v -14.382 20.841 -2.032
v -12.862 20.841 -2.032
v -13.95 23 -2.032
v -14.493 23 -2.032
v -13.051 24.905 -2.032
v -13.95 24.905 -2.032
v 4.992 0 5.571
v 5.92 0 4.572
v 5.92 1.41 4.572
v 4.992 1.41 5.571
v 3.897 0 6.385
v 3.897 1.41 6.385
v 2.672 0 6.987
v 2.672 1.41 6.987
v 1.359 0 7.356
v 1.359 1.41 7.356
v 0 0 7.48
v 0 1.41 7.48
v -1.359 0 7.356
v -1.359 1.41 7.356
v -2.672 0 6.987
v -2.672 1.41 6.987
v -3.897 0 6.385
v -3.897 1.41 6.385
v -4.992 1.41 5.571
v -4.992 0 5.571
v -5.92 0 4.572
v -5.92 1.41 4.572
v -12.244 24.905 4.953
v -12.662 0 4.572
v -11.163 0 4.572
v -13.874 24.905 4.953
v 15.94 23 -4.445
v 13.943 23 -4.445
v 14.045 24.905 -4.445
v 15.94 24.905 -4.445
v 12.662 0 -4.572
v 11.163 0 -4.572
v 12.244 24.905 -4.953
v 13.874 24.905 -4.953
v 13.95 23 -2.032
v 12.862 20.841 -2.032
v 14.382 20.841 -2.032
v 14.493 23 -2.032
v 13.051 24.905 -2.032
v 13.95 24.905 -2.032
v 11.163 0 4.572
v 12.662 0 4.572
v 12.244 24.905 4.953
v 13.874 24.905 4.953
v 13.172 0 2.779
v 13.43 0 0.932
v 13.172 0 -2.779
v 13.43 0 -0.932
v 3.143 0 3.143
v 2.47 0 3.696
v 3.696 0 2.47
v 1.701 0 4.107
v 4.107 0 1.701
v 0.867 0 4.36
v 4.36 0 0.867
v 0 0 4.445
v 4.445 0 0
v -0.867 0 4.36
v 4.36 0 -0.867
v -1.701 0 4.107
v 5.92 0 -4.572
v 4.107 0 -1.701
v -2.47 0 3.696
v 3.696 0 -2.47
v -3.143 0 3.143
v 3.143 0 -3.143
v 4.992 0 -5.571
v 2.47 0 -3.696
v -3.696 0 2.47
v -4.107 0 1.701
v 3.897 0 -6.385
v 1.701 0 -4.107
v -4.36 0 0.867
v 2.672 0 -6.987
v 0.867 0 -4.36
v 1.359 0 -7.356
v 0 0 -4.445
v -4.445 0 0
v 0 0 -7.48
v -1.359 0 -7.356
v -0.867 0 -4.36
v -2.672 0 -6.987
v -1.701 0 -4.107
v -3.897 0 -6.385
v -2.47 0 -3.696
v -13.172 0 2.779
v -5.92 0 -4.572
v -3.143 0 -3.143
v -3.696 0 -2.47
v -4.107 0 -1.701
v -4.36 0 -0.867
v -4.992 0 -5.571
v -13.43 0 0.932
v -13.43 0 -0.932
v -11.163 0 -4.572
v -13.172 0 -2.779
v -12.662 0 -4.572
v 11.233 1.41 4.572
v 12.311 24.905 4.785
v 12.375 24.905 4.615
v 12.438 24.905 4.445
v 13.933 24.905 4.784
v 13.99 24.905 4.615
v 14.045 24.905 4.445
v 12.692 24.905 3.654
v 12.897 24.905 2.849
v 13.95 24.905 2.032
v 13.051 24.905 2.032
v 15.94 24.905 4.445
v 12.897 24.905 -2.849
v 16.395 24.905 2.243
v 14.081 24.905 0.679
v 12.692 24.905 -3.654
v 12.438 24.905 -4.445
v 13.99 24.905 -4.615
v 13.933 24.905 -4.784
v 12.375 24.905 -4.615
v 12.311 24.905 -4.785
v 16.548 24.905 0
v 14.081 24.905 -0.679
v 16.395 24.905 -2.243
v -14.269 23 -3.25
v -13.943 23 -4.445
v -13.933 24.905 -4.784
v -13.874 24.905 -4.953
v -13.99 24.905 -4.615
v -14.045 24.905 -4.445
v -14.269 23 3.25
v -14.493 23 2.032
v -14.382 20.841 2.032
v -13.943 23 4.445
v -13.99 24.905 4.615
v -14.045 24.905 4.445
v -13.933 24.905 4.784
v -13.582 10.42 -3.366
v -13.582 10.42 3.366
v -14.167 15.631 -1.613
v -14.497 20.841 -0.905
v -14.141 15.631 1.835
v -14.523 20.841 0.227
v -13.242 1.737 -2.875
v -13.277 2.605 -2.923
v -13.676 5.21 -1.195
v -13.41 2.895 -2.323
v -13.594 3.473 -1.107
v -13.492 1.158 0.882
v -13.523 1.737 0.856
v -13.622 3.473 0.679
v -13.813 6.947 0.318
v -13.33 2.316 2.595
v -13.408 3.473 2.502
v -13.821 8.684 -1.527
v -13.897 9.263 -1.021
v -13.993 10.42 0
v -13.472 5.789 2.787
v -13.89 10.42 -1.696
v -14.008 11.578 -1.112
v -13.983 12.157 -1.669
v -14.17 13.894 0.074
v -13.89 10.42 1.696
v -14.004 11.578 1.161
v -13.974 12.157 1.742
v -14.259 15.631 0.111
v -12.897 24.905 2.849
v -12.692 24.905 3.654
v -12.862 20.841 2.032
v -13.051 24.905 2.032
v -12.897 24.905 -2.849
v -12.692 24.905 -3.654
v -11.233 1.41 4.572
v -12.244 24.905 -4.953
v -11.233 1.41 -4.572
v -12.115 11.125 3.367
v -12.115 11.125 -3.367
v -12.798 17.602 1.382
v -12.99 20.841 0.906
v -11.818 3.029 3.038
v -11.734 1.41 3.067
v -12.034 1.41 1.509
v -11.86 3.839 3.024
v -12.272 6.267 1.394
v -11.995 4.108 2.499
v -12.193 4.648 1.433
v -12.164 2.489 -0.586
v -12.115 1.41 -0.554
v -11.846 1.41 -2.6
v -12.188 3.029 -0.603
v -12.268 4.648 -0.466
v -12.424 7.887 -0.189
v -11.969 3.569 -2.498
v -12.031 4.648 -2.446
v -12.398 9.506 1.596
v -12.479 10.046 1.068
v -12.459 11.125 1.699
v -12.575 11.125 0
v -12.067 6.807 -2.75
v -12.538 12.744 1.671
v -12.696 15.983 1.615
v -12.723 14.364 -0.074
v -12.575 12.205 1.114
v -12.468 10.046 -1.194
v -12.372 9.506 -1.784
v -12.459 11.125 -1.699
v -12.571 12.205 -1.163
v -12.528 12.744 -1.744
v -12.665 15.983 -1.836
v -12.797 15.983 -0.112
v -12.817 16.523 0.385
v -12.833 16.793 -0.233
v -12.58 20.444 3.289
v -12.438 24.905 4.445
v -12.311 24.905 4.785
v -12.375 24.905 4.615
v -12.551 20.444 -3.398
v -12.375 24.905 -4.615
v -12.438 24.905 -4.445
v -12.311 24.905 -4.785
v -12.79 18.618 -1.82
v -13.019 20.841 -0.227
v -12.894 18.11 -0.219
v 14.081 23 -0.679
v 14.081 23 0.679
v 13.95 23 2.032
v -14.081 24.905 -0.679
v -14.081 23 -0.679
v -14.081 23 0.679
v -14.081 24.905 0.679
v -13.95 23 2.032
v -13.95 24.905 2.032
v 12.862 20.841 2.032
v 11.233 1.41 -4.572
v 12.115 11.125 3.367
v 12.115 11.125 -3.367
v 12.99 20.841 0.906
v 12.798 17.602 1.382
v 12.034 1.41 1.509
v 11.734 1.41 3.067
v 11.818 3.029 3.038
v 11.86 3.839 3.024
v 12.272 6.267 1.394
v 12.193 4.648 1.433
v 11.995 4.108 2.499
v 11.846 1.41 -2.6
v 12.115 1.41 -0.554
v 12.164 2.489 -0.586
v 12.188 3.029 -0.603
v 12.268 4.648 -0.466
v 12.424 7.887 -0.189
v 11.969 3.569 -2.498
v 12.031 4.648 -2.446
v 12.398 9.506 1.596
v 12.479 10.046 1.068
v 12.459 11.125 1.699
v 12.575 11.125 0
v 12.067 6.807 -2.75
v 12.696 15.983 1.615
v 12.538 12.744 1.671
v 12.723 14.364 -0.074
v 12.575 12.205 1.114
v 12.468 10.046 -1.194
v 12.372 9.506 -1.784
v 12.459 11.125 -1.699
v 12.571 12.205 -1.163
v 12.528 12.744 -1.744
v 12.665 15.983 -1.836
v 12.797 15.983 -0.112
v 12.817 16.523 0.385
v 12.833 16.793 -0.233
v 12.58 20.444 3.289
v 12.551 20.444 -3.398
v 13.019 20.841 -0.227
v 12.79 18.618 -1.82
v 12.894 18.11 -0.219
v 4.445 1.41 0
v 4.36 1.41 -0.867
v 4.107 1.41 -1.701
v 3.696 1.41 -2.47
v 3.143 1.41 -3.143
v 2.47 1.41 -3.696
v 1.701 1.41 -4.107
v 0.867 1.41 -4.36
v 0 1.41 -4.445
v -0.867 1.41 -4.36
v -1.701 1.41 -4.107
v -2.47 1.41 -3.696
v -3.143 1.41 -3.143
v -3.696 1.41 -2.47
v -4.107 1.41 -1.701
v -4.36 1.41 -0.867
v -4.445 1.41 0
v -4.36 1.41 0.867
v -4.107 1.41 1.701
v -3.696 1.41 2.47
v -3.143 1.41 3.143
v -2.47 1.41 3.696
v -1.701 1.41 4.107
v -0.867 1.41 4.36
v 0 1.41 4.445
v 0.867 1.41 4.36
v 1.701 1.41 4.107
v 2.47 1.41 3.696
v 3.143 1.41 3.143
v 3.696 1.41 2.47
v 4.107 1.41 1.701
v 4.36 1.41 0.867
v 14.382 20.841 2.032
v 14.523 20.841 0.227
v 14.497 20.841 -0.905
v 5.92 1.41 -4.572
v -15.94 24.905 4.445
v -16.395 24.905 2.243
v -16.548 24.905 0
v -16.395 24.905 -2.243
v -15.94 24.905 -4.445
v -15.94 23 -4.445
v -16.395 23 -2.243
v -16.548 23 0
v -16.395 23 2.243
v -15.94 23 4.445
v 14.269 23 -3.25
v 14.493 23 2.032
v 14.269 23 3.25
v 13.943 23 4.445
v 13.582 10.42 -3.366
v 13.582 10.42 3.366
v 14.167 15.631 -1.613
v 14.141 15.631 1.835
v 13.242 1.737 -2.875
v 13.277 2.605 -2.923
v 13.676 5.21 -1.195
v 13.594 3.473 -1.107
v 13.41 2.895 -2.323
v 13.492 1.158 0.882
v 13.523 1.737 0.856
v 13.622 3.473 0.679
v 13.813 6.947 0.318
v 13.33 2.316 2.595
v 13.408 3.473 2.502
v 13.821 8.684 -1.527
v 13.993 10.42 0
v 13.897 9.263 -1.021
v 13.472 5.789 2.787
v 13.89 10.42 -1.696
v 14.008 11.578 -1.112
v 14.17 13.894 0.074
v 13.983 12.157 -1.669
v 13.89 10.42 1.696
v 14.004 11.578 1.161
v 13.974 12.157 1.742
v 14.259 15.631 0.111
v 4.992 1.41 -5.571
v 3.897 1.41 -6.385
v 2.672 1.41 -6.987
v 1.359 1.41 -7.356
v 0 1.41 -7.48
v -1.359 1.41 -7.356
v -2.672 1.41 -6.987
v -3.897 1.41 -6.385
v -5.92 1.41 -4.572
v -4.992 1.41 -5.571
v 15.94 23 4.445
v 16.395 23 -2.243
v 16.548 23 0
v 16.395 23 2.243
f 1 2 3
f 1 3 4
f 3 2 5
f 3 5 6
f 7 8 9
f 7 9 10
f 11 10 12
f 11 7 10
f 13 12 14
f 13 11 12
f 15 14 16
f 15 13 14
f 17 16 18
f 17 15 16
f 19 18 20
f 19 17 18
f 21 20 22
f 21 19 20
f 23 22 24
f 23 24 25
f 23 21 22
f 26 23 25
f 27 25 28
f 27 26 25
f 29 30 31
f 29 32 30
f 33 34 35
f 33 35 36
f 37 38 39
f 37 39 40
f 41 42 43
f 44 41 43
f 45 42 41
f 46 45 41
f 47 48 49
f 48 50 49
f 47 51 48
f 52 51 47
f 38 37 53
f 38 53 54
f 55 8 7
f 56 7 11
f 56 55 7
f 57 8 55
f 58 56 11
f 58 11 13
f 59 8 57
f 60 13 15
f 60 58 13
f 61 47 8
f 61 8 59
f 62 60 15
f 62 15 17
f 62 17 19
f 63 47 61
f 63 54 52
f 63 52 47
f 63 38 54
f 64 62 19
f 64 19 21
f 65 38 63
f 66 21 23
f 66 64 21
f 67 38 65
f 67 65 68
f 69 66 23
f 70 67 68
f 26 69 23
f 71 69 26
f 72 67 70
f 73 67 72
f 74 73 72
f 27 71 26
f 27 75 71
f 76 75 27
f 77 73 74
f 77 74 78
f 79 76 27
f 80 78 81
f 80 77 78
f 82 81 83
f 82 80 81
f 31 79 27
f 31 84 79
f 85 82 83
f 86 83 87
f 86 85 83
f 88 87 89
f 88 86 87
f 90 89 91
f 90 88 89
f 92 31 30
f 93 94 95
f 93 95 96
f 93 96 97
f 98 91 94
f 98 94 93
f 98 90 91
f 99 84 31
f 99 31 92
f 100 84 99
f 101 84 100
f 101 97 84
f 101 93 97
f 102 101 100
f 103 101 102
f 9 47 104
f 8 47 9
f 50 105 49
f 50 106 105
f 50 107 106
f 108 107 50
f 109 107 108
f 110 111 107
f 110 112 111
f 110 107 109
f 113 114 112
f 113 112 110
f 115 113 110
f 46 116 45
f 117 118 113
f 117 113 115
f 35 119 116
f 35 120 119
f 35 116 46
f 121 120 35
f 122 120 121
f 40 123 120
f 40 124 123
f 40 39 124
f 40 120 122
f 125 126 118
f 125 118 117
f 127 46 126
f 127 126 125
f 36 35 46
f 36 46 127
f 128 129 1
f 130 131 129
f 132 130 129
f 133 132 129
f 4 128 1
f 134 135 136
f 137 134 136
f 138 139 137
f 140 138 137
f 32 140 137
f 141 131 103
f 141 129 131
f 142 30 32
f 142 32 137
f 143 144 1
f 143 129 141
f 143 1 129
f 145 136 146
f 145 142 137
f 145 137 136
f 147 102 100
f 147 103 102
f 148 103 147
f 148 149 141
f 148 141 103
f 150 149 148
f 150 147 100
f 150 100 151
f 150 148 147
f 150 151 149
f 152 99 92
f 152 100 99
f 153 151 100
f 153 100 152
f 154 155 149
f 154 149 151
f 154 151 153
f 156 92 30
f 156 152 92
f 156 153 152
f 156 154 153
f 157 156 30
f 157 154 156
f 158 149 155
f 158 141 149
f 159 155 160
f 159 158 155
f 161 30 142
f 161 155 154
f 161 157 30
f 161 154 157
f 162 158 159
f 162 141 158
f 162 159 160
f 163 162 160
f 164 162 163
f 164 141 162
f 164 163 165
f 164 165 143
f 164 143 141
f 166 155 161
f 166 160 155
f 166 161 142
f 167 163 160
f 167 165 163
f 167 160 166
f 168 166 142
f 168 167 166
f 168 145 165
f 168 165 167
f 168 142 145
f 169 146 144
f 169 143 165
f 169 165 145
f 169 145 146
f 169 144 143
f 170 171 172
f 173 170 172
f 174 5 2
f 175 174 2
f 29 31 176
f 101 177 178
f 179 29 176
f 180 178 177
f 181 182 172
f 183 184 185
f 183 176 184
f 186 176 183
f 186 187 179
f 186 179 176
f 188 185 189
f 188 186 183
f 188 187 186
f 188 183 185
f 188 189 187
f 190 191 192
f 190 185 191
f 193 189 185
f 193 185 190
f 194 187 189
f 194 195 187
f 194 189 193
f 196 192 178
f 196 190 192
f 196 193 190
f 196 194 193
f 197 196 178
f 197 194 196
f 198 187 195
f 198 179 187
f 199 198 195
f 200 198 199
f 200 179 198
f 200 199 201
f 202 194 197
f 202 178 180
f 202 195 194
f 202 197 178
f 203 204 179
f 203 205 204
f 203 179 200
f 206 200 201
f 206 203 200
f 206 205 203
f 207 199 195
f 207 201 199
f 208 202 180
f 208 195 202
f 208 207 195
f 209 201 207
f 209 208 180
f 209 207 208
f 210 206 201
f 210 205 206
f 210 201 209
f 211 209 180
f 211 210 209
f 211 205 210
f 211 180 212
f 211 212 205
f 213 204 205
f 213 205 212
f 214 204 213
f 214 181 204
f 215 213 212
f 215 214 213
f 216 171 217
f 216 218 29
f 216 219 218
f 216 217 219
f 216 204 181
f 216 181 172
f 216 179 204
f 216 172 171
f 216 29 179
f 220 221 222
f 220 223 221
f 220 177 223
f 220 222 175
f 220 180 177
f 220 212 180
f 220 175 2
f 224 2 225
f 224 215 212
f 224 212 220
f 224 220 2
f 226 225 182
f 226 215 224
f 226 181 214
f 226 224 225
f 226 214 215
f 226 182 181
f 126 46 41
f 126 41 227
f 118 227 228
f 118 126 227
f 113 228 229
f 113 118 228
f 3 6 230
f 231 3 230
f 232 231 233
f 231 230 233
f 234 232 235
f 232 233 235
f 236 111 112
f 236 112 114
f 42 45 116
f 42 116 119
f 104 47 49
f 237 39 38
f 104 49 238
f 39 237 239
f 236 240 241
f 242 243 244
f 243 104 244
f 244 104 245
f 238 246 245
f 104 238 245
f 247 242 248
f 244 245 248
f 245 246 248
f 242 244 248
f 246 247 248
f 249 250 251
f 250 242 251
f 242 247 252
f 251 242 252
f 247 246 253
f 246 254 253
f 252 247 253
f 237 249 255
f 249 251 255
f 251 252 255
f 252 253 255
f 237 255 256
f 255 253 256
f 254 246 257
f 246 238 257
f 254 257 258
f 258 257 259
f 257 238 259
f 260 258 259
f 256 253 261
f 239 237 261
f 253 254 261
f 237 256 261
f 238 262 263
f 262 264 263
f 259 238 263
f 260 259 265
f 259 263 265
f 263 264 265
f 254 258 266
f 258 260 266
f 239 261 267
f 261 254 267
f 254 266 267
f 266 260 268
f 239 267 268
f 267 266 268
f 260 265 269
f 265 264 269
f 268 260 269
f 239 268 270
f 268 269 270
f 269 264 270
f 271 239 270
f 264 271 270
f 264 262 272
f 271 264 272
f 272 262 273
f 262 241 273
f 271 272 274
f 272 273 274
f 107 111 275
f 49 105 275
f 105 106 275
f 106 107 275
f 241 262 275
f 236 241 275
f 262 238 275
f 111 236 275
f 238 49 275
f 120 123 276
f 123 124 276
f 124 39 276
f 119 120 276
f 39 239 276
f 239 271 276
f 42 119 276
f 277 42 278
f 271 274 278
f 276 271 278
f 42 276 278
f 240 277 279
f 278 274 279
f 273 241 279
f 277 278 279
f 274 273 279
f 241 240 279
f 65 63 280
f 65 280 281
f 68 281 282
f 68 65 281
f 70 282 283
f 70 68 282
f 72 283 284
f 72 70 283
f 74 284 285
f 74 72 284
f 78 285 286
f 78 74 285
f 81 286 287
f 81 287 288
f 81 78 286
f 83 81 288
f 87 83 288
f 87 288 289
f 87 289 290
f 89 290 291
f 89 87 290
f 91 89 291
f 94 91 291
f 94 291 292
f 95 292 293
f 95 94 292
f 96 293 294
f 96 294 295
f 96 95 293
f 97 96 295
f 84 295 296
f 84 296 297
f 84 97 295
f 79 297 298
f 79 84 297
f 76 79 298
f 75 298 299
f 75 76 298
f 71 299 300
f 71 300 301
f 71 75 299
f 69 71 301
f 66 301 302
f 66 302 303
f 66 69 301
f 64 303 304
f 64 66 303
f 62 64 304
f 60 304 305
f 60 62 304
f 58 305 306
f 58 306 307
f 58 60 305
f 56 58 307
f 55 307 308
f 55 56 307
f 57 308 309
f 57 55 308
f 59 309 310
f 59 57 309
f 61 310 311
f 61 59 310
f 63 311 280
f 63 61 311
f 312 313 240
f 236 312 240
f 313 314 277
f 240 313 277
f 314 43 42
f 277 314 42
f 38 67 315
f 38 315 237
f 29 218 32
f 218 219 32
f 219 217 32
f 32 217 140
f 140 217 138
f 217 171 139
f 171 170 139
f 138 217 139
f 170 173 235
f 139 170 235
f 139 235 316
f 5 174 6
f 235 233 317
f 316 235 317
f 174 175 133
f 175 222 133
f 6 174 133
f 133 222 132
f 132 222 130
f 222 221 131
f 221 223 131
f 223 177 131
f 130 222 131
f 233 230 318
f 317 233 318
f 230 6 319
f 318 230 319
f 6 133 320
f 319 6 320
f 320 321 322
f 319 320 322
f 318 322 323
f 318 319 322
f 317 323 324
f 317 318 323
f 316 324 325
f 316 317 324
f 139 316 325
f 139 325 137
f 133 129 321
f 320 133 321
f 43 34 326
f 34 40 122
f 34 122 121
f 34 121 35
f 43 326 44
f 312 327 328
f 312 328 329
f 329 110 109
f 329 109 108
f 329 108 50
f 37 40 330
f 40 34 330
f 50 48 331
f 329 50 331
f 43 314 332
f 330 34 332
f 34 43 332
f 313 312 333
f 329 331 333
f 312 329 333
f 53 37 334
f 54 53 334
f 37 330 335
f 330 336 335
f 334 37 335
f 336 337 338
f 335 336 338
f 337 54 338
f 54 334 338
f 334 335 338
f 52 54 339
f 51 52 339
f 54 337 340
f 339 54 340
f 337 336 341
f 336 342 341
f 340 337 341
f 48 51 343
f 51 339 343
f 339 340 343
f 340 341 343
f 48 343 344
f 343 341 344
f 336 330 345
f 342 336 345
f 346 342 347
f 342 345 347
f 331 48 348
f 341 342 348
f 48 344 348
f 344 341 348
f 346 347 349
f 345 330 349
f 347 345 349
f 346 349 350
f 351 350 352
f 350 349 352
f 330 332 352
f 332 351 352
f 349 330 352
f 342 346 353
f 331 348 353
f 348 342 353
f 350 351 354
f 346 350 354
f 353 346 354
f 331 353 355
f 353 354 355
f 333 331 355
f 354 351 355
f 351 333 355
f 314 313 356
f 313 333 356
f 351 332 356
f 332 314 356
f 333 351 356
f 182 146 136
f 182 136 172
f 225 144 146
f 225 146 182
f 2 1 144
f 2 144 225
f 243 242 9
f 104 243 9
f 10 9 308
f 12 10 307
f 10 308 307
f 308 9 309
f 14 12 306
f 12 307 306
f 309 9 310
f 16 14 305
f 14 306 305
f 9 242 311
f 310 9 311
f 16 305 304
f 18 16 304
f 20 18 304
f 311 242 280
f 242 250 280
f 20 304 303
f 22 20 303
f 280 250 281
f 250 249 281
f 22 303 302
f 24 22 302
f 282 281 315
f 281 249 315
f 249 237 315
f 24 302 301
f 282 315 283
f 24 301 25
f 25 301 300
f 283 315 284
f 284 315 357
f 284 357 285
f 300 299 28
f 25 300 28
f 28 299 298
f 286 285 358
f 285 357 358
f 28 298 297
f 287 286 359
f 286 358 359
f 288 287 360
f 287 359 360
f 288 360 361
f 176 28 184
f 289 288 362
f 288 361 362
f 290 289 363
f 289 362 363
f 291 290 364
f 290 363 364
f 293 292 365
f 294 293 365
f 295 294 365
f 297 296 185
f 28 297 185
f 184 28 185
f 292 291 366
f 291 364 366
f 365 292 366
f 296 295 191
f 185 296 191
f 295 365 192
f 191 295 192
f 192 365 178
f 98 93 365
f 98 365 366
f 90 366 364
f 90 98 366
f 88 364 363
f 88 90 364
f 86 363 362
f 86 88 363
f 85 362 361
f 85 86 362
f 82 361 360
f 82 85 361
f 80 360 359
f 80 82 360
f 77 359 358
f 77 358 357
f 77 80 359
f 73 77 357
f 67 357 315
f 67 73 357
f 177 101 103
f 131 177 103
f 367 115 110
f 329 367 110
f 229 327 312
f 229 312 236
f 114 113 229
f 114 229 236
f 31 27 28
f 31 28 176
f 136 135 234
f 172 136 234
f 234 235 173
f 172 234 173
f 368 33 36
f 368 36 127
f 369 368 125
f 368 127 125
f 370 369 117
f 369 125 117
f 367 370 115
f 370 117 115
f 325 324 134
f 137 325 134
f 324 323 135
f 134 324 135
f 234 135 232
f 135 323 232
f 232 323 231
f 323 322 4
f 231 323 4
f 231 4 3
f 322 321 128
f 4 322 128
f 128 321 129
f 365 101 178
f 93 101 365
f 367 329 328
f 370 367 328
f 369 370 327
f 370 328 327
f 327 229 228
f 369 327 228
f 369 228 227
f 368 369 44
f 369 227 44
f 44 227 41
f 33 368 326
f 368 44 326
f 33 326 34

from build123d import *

# Parameters (mm, degrees)
SKETCH1_R                 = 4.445
BASE_DEPTH                = 1.4097
RADIAL_FLANGE_DEPTH       = 1.905
AXIAL_CUT_OUT_DEPTH       = 4.064
SKETCH6_W                 = 4.064
SKETCH6_H                 = 2.159
RADIAL_CUT_OUT_DEPTH      = 17.5481001
RADIAL_CUT_OUT_DEPTH_BACK = 17.5481001


with BuildPart() as part:
    # Sketch1 → Base (new body)
    with BuildSketch(Plane(origin=(0, 0, 0), x_dir=(1, 0, 0), z_dir=(0, 1, 0))):
        with BuildLine():
            Line((-12.661842678, 4.572), (-5.920447964, 4.572))
            ThreePointArc((-5.920447964, 4.572), (0, 7.4803), (5.920447964, 4.572))
            Line((5.920447964, 4.572), (12.661842678, 4.572))
            ThreePointArc((12.661842678, 4.572), (13.462, 0), (12.661842678, -4.572))
            Line((12.661842678, -4.572), (5.920447964, -4.572))
            ThreePointArc((5.920447964, -4.572), (0, -7.4803), (-5.920447964, -4.572))
            Line((-5.920447964, -4.572), (-12.661842678, -4.572))
            ThreePointArc((-12.661842678, -4.572), (-13.462, 0), (-12.661842678, 4.572))
        make_face()
        Circle(SKETCH1_R, mode=Mode.SUBTRACT)
    extrude(amount=BASE_DEPTH)

    # Sketch3 → Arm loft section 0
    with BuildSketch(Plane(origin=(0, 0, 0), x_dir=(1, 0, 0), z_dir=(0, 1, 0))):
        with BuildLine():
            Line((-12.661842678, -4.572), (-11.163242678, -4.572))
            ThreePointArc((-11.163242678, -4.572), (-12.06321562, 0), (-11.163242678, 4.572))
            Line((-11.163242678, 4.572), (-12.661842678, 4.572))
            ThreePointArc((-12.661842678, 4.572), (-13.462, 0), (-12.661842678, -4.572))
        make_face()
    # Sketch2 → Arm loft section 1
    with BuildSketch(Plane(origin=(0, 24.9047, 0), x_dir=(-1, 0, 0), z_dir=(0, -1, 0))):
        with BuildLine():
            Line((12.244143702, 4.953), (13.874423051, 4.953))
            ThreePointArc((13.874423051, 4.953), (14.732, 0), (13.874423051, -4.953))
            Line((13.874423051, -4.953), (12.244143702, -4.953))
            ThreePointArc((12.244143702, -4.953), (13.208, 0), (12.244143702, 4.953))
        make_face()
    arm_loft = loft()

    # Mirror of arm loft: Arm loft across plane
    add(arm_loft.mirror(Plane(origin=(0, 0, 0), x_dir=(0, 0, 1), z_dir=(1, 0, 0))))

    # Sketch4 → Radial flange (add)
    with BuildSketch(Plane(origin=(0, 24.9047, 0), x_dir=(-1, 0, 0), z_dir=(0, -1, 0))):
        with BuildLine():
            Line((12.437573678, 4.445), (15.939936907, 4.445))
            ThreePointArc((15.939936907, 4.445), (16.5481, 0), (15.939936907, -4.445))
            Line((15.939936907, -4.445), (12.437573678, -4.445))
            ThreePointArc((12.437573678, -4.445), (13.208, 0), (12.437573678, 4.445))
        make_face()
    radial_flange = extrude(amount=RADIAL_FLANGE_DEPTH)

    # Sketch5 → Axial cut-out (cut)
    with BuildSketch(Plane(origin=(0, 24.9047, 0), x_dir=(1, 0, 0), z_dir=(0, 1, 0))):
        with BuildLine():
            Line((-11.247927631, 2.032), (-13.949780823, 2.032))
            ThreePointArc((-13.949780823, 2.032), (-14.097, 0), (-13.949780823, -2.032))
            Line((-13.949780823, -2.032), (-11.247927631, -2.032))
            ThreePointArc((-11.247927631, -2.032), (-11.43, 0), (-11.247927631, 2.032))
        make_face()
    axial_cut_out = extrude(amount=-AXIAL_CUT_OUT_DEPTH, mode=Mode.SUBTRACT)

    # Mirror of radial flange and axial cut-out: Radial flange, Axial cut-out across plane
    add(radial_flange.mirror(Plane(origin=(0, 0, 0), x_dir=(0, 0, 1), z_dir=(1, 0, 0))))
    add(axial_cut_out.mirror(Plane(origin=(0, 0, 0), x_dir=(0, 0, 1), z_dir=(1, 0, 0))), mode=Mode.SUBTRACT)

    # Sketch6 → Radial cut-out (cut, two sides)
    with BuildSketch(Plane(origin=(0, 0, 0), x_dir=(0, 0, -1), z_dir=(1, 0, 0))) as radial_cut_out_sk:
        with Locations((0, 21.9202)):
            Rectangle(SKETCH6_W, SKETCH6_H)
    extrude(amount=RADIAL_CUT_OUT_DEPTH, mode=Mode.SUBTRACT)
    extrude(radial_cut_out_sk.sketch, amount=-RADIAL_CUT_OUT_DEPTH_BACK, mode=Mode.SUBTRACT)


solid = part.part
